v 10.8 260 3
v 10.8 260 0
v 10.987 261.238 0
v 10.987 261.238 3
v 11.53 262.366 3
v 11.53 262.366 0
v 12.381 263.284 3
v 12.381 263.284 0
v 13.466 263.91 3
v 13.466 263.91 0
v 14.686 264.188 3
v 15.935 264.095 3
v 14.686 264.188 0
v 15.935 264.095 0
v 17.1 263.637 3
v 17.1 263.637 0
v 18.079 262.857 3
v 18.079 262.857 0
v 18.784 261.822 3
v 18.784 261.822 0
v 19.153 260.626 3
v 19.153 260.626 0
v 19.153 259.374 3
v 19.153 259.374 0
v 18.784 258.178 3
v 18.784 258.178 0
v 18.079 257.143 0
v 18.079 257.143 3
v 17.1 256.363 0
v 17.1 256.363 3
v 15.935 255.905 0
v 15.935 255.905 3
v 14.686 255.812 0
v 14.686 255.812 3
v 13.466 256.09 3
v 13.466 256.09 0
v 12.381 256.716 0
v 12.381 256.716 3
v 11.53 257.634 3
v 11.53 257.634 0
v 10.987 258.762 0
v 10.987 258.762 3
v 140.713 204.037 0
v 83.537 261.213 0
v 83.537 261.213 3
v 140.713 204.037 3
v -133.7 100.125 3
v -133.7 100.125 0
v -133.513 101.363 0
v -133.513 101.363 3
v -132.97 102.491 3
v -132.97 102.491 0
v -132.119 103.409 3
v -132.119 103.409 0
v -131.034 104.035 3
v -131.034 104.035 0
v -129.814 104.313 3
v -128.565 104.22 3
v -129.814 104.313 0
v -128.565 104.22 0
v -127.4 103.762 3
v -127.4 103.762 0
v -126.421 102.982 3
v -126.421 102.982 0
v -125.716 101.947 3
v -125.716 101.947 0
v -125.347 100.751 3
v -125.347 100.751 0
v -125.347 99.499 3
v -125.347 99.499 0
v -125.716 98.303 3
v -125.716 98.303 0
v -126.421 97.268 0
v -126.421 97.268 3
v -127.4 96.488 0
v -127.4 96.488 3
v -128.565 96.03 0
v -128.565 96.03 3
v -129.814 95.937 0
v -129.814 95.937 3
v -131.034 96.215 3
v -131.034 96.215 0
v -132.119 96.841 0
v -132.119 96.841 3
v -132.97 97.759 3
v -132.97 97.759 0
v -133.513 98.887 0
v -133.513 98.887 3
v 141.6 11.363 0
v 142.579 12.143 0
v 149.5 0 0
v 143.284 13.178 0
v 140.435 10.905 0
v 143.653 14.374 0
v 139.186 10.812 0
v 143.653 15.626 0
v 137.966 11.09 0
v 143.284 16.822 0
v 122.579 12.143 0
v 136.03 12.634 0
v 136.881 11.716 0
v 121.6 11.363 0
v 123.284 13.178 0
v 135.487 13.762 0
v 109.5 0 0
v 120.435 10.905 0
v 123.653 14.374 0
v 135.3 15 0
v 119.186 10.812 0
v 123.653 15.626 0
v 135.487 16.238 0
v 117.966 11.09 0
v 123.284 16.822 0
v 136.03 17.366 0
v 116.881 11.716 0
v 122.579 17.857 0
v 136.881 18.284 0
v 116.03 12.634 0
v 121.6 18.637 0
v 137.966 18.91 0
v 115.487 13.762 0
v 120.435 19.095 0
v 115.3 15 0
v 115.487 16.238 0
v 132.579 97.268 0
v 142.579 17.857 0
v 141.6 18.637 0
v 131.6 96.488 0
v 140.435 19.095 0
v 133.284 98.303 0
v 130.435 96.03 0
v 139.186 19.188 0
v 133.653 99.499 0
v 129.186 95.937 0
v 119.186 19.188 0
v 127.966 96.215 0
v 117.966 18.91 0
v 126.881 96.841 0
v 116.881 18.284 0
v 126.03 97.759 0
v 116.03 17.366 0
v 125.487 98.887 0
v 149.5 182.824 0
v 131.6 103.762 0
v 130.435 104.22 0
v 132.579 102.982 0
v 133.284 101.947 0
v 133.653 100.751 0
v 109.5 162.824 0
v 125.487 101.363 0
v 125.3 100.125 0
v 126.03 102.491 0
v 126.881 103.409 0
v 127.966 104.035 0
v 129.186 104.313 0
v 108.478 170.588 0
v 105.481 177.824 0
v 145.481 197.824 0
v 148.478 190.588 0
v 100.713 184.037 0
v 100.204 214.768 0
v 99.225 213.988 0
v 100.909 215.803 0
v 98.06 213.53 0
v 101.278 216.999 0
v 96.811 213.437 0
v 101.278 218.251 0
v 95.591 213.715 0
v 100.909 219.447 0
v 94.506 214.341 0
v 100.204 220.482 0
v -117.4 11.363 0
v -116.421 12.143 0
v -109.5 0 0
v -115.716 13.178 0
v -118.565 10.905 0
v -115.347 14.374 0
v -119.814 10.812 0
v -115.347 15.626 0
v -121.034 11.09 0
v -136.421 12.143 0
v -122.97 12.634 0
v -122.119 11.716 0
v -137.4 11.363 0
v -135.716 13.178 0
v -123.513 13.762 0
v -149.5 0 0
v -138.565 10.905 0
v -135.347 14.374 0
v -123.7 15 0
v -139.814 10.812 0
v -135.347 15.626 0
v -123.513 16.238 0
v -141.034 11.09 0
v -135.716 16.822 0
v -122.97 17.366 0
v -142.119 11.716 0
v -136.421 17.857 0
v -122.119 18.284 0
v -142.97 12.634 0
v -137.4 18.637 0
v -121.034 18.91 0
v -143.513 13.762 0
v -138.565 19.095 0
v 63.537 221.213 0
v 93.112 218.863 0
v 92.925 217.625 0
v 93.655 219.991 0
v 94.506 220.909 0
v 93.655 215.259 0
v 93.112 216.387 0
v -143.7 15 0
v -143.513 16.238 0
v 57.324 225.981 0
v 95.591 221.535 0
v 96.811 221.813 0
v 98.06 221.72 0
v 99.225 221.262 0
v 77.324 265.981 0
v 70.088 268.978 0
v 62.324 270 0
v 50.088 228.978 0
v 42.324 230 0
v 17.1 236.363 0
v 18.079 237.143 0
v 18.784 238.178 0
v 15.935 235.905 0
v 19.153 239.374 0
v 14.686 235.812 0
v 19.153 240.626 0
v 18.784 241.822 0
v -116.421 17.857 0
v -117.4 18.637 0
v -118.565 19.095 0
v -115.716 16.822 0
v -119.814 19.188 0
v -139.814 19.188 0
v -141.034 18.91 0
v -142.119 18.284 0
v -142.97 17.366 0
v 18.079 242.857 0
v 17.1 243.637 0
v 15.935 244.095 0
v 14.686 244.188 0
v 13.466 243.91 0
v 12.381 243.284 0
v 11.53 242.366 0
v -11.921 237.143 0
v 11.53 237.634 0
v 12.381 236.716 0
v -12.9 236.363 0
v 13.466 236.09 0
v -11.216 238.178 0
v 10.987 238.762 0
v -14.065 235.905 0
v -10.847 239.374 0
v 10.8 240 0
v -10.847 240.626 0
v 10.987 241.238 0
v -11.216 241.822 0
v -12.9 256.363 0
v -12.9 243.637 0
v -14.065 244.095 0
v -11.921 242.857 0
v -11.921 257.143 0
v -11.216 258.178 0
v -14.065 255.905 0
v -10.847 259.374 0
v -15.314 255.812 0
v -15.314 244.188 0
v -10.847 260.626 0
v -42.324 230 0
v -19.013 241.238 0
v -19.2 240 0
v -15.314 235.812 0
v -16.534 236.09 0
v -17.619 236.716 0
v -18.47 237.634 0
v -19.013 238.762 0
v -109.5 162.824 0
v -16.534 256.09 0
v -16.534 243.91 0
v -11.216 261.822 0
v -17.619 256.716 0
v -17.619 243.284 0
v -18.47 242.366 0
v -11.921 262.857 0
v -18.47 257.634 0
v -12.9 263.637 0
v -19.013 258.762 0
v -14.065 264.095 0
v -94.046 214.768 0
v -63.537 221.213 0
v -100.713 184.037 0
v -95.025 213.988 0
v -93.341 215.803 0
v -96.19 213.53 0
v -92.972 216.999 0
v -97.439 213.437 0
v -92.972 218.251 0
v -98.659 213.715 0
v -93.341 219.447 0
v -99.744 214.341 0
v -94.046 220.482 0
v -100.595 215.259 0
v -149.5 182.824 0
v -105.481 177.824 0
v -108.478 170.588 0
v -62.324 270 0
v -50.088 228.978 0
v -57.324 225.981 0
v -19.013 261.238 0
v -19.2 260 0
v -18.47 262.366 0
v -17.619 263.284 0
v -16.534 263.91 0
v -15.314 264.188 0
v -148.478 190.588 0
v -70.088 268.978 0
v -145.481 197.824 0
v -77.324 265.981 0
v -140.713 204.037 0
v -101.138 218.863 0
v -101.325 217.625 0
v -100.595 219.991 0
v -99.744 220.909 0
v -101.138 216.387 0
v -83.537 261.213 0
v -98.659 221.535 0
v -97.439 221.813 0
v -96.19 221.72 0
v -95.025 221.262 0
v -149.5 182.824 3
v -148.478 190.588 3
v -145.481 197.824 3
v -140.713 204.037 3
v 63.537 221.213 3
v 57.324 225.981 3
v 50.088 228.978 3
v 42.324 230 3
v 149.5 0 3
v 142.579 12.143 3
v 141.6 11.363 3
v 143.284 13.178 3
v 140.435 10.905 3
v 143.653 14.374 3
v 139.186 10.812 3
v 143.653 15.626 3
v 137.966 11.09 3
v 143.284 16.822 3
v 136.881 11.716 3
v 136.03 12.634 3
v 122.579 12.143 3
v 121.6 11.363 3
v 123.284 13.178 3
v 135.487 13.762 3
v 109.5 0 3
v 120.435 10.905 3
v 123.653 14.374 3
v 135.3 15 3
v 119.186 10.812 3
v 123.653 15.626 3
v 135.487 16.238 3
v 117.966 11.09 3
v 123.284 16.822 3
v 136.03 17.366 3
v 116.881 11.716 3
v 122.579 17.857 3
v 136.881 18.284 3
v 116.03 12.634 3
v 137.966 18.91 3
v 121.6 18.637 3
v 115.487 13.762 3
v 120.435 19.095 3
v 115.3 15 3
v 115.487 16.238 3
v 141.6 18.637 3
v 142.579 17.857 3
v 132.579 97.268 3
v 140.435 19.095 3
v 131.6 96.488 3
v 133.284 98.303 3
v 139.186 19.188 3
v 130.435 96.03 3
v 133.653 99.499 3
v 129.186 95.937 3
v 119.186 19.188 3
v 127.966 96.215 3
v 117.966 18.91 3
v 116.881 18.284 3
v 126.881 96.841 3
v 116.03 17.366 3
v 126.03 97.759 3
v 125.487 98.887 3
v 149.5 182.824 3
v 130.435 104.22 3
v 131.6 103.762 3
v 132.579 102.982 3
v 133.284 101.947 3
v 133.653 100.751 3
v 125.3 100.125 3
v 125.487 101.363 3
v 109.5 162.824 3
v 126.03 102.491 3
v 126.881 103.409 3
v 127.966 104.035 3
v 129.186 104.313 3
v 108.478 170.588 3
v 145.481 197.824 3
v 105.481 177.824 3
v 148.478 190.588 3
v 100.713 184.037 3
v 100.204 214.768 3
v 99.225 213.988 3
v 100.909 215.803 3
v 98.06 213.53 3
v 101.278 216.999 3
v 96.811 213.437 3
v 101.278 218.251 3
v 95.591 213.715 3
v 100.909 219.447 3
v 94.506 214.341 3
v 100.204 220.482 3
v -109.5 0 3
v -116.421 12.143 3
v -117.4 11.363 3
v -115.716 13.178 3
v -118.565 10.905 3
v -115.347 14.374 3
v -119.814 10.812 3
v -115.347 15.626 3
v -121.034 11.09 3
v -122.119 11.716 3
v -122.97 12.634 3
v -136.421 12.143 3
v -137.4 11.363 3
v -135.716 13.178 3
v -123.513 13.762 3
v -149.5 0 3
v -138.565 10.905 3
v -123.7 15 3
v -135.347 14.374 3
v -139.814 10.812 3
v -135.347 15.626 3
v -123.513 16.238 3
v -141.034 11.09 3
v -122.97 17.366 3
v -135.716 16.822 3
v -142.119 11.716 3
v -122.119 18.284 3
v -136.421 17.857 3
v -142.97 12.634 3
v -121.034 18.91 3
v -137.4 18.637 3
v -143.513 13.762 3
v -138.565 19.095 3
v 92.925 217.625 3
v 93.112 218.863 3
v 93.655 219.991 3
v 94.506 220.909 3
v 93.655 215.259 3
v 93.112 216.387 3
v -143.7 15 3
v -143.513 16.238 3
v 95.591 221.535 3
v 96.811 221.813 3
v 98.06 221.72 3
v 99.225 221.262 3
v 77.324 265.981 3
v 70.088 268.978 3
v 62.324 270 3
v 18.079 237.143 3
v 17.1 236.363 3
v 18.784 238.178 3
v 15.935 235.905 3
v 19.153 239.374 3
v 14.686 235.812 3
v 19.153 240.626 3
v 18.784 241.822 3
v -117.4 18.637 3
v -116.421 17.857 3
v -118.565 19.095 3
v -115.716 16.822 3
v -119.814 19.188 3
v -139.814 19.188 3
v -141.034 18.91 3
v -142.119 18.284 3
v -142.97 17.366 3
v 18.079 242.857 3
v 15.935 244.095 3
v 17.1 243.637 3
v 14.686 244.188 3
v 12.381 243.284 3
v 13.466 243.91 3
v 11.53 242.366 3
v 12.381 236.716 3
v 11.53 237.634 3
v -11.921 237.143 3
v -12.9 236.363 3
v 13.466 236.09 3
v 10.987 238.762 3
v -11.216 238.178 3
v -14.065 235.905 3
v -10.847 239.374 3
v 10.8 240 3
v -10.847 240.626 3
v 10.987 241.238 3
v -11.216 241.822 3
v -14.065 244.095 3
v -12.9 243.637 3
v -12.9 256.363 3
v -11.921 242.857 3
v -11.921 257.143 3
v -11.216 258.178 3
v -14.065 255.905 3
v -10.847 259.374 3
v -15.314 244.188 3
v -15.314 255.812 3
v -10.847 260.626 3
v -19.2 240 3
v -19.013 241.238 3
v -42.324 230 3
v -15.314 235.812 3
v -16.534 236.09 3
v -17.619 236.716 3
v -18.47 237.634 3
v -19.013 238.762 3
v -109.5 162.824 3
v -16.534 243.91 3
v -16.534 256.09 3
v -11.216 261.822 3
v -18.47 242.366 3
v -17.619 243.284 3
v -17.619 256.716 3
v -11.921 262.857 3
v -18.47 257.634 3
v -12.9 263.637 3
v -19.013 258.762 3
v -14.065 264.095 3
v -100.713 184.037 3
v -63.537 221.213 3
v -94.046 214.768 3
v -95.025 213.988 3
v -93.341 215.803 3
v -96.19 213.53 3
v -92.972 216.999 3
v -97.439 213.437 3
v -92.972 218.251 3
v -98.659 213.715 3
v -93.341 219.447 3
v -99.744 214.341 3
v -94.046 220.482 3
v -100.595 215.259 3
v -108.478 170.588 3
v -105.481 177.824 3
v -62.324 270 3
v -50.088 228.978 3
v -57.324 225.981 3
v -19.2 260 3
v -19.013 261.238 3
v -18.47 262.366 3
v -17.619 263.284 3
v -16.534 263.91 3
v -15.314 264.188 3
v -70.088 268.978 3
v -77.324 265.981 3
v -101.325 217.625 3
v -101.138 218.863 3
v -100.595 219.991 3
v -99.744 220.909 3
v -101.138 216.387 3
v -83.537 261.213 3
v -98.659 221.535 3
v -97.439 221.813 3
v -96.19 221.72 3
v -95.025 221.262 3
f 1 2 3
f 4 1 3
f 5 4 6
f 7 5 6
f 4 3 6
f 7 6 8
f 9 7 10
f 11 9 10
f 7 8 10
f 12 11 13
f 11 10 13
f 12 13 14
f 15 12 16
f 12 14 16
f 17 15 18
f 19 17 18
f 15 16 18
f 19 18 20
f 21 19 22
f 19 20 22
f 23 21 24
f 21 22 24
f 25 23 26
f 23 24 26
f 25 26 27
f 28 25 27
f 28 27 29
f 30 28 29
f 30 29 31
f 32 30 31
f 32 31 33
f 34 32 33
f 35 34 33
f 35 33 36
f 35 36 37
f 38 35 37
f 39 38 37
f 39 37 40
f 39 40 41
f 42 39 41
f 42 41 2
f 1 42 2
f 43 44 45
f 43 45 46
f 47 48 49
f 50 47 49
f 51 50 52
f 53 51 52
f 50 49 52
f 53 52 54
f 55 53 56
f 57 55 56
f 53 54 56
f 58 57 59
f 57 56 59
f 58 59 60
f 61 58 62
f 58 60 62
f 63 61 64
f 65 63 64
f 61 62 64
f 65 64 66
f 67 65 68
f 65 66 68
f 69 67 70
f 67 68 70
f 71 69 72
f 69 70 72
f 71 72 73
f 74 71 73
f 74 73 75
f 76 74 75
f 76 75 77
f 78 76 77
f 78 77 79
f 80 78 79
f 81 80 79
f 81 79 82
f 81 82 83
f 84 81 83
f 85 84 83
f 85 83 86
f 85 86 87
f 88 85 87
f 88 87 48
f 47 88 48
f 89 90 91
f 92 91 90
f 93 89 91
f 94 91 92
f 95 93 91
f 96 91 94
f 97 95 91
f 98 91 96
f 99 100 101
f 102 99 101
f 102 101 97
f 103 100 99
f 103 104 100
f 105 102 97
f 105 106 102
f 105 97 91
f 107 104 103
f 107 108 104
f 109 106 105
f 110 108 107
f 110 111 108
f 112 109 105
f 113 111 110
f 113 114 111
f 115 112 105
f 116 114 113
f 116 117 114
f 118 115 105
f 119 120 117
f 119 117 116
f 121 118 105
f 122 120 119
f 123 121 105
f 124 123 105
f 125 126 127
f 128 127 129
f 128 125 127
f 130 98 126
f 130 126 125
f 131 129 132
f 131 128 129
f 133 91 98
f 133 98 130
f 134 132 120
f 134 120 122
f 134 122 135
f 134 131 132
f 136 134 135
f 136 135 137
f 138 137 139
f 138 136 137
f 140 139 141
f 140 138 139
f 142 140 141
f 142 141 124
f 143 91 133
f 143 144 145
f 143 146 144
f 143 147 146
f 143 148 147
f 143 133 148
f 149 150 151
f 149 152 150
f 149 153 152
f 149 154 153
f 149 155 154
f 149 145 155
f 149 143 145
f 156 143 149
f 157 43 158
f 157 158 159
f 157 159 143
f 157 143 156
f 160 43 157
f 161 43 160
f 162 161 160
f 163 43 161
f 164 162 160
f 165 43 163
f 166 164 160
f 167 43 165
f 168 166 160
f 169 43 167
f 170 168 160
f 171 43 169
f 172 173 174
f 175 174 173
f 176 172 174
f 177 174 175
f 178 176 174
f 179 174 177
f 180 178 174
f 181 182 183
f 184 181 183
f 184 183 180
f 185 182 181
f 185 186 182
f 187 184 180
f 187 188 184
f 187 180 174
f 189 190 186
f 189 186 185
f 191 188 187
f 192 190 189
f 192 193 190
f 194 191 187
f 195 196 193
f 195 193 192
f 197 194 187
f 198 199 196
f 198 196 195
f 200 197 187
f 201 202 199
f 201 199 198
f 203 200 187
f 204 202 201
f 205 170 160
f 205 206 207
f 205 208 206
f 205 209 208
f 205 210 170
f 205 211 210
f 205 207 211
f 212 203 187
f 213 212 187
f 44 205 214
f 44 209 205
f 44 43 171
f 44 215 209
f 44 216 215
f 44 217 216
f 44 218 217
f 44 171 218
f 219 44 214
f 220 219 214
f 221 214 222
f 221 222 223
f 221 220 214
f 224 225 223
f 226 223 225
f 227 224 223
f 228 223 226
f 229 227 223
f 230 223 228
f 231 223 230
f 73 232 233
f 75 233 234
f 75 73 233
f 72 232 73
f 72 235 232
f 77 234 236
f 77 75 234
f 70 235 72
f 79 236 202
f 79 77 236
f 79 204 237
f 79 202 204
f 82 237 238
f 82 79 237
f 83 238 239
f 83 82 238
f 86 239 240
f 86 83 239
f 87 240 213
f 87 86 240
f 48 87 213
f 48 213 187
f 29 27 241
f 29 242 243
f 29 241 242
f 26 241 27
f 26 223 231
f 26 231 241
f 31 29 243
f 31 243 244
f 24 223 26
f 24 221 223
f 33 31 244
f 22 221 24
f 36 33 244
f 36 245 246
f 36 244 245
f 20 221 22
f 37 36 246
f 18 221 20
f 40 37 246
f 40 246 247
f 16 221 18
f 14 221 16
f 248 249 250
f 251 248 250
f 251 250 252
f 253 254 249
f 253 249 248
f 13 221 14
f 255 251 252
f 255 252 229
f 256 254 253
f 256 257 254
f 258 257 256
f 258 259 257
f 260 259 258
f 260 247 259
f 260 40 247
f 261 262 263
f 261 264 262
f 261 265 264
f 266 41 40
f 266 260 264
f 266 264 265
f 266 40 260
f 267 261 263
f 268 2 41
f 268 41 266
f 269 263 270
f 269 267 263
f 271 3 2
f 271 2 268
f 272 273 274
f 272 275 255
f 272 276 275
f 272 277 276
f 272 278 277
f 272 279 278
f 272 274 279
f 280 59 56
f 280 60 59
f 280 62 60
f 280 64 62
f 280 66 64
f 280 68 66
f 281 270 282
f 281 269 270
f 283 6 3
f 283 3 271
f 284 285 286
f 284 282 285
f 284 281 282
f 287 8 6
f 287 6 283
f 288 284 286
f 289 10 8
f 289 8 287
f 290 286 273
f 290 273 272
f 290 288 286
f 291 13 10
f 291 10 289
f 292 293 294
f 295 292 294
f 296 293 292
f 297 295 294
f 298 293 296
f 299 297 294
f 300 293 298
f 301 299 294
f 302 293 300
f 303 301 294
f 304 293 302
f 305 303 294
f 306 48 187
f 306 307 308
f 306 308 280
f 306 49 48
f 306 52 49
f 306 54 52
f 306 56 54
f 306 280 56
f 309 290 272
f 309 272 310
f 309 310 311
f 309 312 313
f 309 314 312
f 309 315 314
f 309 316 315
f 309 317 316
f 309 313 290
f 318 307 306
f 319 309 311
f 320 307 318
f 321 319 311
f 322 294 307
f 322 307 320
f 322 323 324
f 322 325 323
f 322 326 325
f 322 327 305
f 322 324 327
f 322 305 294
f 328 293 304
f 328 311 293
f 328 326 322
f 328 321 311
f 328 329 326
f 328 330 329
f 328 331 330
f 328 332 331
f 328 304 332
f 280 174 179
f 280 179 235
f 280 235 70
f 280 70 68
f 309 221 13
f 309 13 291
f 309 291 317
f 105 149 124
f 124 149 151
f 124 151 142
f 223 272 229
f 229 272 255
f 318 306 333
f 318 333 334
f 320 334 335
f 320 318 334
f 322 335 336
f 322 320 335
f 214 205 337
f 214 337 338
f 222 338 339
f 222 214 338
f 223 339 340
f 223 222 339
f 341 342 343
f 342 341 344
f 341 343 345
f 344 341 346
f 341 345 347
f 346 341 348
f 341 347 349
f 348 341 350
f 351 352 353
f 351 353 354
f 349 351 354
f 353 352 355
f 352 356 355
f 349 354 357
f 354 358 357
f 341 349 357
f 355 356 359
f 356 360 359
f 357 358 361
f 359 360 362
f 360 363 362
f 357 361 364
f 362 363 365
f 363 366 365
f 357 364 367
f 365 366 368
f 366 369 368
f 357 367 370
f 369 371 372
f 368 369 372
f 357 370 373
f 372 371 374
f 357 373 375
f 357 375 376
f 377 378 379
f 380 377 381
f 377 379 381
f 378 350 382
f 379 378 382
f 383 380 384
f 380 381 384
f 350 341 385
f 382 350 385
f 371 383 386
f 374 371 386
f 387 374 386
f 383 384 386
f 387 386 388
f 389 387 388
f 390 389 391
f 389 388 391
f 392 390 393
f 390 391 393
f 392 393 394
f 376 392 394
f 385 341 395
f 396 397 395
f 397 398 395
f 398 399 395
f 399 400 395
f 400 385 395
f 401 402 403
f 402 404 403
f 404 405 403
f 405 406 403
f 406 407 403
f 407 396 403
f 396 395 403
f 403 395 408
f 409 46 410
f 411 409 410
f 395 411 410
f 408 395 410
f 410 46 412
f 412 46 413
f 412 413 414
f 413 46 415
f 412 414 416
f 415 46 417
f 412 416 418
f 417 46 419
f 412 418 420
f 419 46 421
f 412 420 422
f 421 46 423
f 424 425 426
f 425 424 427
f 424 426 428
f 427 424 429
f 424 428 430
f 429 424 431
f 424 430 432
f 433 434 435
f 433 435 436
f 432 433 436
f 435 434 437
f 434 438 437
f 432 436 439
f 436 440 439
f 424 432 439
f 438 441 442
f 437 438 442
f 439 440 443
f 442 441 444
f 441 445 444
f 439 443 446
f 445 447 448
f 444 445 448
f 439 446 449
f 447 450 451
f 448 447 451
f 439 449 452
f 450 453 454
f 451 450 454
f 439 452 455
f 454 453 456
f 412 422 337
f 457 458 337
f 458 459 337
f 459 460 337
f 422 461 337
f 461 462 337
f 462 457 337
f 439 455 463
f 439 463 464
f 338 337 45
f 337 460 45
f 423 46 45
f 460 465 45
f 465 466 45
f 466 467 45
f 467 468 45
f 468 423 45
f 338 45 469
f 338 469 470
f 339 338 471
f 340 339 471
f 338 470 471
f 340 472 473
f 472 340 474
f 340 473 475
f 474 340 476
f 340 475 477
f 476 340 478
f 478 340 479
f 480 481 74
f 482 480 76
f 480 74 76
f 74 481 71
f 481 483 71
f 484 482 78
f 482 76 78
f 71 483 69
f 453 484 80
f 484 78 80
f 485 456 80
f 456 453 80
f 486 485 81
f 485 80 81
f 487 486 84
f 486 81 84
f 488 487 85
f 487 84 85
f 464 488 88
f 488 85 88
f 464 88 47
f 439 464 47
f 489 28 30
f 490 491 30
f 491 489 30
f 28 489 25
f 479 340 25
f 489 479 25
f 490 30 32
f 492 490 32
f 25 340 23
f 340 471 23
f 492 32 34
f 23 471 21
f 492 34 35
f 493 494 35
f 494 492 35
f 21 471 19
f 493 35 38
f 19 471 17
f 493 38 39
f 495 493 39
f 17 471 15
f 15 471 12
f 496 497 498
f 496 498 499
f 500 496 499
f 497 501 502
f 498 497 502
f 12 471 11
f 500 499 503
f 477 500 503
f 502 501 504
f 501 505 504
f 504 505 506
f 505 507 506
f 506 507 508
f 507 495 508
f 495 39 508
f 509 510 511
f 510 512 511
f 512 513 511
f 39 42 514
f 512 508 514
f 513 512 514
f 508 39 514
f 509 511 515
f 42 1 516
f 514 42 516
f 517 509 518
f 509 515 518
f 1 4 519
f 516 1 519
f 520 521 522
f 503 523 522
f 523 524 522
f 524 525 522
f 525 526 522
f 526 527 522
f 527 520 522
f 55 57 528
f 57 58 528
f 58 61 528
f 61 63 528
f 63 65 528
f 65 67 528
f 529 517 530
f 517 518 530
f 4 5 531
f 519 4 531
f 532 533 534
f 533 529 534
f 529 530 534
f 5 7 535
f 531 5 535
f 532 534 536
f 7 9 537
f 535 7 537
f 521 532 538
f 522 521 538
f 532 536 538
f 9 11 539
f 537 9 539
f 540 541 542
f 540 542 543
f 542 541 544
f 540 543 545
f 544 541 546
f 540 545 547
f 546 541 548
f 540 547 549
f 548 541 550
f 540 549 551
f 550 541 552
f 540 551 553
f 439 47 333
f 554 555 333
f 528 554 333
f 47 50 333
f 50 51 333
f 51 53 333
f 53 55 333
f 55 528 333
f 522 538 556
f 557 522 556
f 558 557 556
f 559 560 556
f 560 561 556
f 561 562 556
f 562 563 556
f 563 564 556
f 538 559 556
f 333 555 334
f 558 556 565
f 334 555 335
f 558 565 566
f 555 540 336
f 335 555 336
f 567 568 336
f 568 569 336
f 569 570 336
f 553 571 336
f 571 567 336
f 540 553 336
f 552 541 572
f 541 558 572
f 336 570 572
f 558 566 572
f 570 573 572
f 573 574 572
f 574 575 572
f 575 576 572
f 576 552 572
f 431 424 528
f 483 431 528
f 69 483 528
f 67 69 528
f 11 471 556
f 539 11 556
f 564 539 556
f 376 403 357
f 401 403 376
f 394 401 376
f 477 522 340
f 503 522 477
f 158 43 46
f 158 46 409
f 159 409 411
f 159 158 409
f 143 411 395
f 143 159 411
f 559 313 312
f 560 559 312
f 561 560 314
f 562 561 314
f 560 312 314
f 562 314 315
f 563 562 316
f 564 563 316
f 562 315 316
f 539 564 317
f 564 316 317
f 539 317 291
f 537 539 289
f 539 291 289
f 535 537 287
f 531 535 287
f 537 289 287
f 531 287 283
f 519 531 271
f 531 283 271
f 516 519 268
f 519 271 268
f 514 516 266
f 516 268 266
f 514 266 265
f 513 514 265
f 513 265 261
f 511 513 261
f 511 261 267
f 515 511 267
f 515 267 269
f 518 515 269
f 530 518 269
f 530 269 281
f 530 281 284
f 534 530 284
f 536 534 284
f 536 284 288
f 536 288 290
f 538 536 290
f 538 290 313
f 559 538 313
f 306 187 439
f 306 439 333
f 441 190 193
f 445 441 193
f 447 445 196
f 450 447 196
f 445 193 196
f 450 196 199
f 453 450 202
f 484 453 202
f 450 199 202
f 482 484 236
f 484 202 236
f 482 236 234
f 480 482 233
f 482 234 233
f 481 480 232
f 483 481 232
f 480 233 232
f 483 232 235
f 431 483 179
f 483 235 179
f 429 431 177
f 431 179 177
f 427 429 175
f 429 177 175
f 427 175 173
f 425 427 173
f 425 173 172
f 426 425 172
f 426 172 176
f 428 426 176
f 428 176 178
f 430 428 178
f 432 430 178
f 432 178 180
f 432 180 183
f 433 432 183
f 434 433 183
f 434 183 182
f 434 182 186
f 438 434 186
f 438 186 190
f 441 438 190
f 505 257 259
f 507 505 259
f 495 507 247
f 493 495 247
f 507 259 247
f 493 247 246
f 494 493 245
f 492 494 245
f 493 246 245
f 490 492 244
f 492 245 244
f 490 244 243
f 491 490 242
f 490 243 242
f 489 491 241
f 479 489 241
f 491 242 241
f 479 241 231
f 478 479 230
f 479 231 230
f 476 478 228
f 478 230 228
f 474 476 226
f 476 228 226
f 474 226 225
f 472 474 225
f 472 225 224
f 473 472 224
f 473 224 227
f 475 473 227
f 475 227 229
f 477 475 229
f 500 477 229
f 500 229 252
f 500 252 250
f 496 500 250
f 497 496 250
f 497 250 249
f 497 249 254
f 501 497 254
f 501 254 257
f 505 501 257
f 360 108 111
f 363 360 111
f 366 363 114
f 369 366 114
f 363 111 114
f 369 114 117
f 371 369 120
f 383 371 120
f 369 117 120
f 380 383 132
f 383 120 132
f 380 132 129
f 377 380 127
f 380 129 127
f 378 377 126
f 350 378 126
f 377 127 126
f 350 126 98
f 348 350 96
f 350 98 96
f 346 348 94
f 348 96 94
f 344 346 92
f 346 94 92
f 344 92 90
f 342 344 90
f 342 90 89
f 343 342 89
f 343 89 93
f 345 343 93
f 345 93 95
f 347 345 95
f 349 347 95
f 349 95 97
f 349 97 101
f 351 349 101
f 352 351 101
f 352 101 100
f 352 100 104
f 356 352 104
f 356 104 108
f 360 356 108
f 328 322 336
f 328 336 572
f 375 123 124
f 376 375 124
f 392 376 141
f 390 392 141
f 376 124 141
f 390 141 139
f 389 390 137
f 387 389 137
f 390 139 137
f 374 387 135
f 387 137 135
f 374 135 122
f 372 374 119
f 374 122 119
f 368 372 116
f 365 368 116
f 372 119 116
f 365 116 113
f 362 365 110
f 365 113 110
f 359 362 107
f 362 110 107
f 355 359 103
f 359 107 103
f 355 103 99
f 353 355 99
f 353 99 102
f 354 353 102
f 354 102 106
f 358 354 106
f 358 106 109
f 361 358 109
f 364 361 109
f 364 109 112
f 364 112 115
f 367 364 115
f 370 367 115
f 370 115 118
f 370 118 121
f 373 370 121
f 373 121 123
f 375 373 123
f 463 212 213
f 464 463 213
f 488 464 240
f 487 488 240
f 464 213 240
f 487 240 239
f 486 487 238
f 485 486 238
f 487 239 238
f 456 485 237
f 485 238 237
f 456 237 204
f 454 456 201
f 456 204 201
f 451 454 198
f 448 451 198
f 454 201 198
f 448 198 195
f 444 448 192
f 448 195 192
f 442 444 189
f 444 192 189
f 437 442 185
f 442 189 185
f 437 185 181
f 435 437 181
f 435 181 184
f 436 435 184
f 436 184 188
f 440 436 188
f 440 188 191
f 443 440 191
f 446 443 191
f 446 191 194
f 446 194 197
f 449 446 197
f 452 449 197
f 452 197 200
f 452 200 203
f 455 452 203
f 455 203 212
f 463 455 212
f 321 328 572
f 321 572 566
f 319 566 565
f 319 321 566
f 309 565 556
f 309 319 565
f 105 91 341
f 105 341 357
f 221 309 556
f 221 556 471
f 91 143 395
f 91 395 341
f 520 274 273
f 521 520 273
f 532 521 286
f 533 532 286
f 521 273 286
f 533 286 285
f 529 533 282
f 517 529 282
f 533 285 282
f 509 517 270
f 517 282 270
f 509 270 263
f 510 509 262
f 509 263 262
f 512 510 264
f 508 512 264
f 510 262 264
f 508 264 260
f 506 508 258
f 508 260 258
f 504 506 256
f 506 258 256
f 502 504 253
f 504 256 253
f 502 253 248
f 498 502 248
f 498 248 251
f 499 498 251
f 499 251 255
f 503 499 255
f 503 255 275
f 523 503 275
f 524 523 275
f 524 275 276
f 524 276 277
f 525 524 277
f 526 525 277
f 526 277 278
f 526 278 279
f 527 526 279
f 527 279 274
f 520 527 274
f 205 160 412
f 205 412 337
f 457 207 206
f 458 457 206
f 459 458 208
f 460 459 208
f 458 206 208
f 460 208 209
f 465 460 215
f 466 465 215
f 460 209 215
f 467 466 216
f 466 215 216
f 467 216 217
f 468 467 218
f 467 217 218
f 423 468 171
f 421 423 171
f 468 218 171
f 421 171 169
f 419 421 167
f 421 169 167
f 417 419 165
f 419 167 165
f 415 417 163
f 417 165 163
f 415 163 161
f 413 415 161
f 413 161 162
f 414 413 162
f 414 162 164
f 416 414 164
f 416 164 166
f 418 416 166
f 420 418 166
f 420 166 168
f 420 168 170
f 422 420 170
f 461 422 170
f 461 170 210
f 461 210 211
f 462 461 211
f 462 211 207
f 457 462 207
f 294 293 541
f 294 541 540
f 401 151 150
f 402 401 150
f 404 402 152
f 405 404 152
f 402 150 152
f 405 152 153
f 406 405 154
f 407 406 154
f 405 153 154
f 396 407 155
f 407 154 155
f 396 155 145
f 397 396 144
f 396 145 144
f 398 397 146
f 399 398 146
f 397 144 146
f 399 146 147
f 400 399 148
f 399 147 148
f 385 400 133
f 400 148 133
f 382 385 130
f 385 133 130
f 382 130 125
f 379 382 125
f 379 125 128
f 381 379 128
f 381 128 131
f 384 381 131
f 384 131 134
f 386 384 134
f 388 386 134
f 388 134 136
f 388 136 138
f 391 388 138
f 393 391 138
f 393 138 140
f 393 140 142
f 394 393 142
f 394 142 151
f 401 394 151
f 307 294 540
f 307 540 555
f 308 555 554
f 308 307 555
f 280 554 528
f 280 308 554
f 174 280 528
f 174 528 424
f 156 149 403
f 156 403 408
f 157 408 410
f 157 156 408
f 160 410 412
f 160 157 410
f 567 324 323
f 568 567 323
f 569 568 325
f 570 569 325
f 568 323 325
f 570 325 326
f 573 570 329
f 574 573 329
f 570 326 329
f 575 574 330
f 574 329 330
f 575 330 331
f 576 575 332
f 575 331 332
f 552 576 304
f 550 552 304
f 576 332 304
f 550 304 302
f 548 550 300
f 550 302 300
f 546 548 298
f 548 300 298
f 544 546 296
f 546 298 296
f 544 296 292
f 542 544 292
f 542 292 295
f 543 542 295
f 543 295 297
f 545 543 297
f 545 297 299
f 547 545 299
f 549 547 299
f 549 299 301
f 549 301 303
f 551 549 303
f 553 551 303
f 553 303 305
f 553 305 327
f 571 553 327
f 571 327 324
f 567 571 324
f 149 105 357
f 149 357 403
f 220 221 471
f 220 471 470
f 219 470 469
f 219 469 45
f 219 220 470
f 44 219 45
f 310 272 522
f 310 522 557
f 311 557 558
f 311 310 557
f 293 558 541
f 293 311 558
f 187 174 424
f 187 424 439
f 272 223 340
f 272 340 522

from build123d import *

# Parameters (mm, degrees)
SALIENTE_EXTRUIR1_DEPTH      = 3
TALADRO_DE_MARGEN_PARA_M81_D = 8.4


with BuildPart() as part:
    # Croquis1 → Saliente-Extruir1 (new body)
    with BuildSketch(Plane.XY):
        with BuildLine():
            Line((-63.536796564, 221.213203436), (-100.713203436, 184.036796564))
            ThreePointArc((-100.713203436, 184.036796564), (-107.216385975, 174.3040961), (-109.5, 162.823593129))
            Line((-109.5, 162.823593129), (-109.5, 0))
            Line((-109.5, 0), (-149.5, 0))
            Line((-149.5, 0), (-149.5, 182.823593129))
            ThreePointArc((-149.5, 182.823593129), (-147.216385975, 194.3040961), (-140.713203436, 204.036796564))
            Line((-140.713203436, 204.036796564), (-83.536796564, 261.213203436))
            ThreePointArc((-83.536796564, 261.213203436), (-73.8040961, 267.716385975), (-62.323593129, 270))
            Line((-62.323593129, 270), (62.323593129, 270))
            ThreePointArc((62.323593129, 270), (73.8040961, 267.716385975), (83.536796564, 261.213203436))
            Line((83.536796564, 261.213203436), (140.713203436, 204.036796564))
            ThreePointArc((140.713203436, 204.036796564), (147.216385975, 194.3040961), (149.5, 182.823593129))
            Line((149.5, 182.823593129), (149.5, 0))
            Line((149.5, 0), (109.5, 0))
            Line((109.5, 0), (109.5, 162.823593129))
            ThreePointArc((109.5, 162.823593129), (107.216385975, 174.3040961), (100.713203436, 184.036796564))
            Line((100.713203436, 184.036796564), (63.536796564, 221.213203436))
            ThreePointArc((63.536796564, 221.213203436), (53.8040961, 227.716385975), (42.323593129, 230))
            Line((42.323593129, 230), (-42.323593129, 230))
            ThreePointArc((-42.323593129, 230), (-53.8040961, 227.716385975), (-63.536796564, 221.213203436))
        make_face()
    extrude(amount=SALIENTE_EXTRUIR1_DEPTH)

    # Taladro de margen para M81 (through all)
    with Locations(Plane.XY.offset(3)):
        with Locations((-119.5, 15), (-139.5, 15), (0, 15), (139.5, 15), (-15, 260), (-15, 240), (15, 240), (15, 260), (-129.5, 100.125), (-97.125, 217.625), (129.5, 100.125), (97.125, 217.625), (119.5, 15)):
            Hole(TALADRO_DE_MARGEN_PARA_M81_D / 2)


solid = part.part
